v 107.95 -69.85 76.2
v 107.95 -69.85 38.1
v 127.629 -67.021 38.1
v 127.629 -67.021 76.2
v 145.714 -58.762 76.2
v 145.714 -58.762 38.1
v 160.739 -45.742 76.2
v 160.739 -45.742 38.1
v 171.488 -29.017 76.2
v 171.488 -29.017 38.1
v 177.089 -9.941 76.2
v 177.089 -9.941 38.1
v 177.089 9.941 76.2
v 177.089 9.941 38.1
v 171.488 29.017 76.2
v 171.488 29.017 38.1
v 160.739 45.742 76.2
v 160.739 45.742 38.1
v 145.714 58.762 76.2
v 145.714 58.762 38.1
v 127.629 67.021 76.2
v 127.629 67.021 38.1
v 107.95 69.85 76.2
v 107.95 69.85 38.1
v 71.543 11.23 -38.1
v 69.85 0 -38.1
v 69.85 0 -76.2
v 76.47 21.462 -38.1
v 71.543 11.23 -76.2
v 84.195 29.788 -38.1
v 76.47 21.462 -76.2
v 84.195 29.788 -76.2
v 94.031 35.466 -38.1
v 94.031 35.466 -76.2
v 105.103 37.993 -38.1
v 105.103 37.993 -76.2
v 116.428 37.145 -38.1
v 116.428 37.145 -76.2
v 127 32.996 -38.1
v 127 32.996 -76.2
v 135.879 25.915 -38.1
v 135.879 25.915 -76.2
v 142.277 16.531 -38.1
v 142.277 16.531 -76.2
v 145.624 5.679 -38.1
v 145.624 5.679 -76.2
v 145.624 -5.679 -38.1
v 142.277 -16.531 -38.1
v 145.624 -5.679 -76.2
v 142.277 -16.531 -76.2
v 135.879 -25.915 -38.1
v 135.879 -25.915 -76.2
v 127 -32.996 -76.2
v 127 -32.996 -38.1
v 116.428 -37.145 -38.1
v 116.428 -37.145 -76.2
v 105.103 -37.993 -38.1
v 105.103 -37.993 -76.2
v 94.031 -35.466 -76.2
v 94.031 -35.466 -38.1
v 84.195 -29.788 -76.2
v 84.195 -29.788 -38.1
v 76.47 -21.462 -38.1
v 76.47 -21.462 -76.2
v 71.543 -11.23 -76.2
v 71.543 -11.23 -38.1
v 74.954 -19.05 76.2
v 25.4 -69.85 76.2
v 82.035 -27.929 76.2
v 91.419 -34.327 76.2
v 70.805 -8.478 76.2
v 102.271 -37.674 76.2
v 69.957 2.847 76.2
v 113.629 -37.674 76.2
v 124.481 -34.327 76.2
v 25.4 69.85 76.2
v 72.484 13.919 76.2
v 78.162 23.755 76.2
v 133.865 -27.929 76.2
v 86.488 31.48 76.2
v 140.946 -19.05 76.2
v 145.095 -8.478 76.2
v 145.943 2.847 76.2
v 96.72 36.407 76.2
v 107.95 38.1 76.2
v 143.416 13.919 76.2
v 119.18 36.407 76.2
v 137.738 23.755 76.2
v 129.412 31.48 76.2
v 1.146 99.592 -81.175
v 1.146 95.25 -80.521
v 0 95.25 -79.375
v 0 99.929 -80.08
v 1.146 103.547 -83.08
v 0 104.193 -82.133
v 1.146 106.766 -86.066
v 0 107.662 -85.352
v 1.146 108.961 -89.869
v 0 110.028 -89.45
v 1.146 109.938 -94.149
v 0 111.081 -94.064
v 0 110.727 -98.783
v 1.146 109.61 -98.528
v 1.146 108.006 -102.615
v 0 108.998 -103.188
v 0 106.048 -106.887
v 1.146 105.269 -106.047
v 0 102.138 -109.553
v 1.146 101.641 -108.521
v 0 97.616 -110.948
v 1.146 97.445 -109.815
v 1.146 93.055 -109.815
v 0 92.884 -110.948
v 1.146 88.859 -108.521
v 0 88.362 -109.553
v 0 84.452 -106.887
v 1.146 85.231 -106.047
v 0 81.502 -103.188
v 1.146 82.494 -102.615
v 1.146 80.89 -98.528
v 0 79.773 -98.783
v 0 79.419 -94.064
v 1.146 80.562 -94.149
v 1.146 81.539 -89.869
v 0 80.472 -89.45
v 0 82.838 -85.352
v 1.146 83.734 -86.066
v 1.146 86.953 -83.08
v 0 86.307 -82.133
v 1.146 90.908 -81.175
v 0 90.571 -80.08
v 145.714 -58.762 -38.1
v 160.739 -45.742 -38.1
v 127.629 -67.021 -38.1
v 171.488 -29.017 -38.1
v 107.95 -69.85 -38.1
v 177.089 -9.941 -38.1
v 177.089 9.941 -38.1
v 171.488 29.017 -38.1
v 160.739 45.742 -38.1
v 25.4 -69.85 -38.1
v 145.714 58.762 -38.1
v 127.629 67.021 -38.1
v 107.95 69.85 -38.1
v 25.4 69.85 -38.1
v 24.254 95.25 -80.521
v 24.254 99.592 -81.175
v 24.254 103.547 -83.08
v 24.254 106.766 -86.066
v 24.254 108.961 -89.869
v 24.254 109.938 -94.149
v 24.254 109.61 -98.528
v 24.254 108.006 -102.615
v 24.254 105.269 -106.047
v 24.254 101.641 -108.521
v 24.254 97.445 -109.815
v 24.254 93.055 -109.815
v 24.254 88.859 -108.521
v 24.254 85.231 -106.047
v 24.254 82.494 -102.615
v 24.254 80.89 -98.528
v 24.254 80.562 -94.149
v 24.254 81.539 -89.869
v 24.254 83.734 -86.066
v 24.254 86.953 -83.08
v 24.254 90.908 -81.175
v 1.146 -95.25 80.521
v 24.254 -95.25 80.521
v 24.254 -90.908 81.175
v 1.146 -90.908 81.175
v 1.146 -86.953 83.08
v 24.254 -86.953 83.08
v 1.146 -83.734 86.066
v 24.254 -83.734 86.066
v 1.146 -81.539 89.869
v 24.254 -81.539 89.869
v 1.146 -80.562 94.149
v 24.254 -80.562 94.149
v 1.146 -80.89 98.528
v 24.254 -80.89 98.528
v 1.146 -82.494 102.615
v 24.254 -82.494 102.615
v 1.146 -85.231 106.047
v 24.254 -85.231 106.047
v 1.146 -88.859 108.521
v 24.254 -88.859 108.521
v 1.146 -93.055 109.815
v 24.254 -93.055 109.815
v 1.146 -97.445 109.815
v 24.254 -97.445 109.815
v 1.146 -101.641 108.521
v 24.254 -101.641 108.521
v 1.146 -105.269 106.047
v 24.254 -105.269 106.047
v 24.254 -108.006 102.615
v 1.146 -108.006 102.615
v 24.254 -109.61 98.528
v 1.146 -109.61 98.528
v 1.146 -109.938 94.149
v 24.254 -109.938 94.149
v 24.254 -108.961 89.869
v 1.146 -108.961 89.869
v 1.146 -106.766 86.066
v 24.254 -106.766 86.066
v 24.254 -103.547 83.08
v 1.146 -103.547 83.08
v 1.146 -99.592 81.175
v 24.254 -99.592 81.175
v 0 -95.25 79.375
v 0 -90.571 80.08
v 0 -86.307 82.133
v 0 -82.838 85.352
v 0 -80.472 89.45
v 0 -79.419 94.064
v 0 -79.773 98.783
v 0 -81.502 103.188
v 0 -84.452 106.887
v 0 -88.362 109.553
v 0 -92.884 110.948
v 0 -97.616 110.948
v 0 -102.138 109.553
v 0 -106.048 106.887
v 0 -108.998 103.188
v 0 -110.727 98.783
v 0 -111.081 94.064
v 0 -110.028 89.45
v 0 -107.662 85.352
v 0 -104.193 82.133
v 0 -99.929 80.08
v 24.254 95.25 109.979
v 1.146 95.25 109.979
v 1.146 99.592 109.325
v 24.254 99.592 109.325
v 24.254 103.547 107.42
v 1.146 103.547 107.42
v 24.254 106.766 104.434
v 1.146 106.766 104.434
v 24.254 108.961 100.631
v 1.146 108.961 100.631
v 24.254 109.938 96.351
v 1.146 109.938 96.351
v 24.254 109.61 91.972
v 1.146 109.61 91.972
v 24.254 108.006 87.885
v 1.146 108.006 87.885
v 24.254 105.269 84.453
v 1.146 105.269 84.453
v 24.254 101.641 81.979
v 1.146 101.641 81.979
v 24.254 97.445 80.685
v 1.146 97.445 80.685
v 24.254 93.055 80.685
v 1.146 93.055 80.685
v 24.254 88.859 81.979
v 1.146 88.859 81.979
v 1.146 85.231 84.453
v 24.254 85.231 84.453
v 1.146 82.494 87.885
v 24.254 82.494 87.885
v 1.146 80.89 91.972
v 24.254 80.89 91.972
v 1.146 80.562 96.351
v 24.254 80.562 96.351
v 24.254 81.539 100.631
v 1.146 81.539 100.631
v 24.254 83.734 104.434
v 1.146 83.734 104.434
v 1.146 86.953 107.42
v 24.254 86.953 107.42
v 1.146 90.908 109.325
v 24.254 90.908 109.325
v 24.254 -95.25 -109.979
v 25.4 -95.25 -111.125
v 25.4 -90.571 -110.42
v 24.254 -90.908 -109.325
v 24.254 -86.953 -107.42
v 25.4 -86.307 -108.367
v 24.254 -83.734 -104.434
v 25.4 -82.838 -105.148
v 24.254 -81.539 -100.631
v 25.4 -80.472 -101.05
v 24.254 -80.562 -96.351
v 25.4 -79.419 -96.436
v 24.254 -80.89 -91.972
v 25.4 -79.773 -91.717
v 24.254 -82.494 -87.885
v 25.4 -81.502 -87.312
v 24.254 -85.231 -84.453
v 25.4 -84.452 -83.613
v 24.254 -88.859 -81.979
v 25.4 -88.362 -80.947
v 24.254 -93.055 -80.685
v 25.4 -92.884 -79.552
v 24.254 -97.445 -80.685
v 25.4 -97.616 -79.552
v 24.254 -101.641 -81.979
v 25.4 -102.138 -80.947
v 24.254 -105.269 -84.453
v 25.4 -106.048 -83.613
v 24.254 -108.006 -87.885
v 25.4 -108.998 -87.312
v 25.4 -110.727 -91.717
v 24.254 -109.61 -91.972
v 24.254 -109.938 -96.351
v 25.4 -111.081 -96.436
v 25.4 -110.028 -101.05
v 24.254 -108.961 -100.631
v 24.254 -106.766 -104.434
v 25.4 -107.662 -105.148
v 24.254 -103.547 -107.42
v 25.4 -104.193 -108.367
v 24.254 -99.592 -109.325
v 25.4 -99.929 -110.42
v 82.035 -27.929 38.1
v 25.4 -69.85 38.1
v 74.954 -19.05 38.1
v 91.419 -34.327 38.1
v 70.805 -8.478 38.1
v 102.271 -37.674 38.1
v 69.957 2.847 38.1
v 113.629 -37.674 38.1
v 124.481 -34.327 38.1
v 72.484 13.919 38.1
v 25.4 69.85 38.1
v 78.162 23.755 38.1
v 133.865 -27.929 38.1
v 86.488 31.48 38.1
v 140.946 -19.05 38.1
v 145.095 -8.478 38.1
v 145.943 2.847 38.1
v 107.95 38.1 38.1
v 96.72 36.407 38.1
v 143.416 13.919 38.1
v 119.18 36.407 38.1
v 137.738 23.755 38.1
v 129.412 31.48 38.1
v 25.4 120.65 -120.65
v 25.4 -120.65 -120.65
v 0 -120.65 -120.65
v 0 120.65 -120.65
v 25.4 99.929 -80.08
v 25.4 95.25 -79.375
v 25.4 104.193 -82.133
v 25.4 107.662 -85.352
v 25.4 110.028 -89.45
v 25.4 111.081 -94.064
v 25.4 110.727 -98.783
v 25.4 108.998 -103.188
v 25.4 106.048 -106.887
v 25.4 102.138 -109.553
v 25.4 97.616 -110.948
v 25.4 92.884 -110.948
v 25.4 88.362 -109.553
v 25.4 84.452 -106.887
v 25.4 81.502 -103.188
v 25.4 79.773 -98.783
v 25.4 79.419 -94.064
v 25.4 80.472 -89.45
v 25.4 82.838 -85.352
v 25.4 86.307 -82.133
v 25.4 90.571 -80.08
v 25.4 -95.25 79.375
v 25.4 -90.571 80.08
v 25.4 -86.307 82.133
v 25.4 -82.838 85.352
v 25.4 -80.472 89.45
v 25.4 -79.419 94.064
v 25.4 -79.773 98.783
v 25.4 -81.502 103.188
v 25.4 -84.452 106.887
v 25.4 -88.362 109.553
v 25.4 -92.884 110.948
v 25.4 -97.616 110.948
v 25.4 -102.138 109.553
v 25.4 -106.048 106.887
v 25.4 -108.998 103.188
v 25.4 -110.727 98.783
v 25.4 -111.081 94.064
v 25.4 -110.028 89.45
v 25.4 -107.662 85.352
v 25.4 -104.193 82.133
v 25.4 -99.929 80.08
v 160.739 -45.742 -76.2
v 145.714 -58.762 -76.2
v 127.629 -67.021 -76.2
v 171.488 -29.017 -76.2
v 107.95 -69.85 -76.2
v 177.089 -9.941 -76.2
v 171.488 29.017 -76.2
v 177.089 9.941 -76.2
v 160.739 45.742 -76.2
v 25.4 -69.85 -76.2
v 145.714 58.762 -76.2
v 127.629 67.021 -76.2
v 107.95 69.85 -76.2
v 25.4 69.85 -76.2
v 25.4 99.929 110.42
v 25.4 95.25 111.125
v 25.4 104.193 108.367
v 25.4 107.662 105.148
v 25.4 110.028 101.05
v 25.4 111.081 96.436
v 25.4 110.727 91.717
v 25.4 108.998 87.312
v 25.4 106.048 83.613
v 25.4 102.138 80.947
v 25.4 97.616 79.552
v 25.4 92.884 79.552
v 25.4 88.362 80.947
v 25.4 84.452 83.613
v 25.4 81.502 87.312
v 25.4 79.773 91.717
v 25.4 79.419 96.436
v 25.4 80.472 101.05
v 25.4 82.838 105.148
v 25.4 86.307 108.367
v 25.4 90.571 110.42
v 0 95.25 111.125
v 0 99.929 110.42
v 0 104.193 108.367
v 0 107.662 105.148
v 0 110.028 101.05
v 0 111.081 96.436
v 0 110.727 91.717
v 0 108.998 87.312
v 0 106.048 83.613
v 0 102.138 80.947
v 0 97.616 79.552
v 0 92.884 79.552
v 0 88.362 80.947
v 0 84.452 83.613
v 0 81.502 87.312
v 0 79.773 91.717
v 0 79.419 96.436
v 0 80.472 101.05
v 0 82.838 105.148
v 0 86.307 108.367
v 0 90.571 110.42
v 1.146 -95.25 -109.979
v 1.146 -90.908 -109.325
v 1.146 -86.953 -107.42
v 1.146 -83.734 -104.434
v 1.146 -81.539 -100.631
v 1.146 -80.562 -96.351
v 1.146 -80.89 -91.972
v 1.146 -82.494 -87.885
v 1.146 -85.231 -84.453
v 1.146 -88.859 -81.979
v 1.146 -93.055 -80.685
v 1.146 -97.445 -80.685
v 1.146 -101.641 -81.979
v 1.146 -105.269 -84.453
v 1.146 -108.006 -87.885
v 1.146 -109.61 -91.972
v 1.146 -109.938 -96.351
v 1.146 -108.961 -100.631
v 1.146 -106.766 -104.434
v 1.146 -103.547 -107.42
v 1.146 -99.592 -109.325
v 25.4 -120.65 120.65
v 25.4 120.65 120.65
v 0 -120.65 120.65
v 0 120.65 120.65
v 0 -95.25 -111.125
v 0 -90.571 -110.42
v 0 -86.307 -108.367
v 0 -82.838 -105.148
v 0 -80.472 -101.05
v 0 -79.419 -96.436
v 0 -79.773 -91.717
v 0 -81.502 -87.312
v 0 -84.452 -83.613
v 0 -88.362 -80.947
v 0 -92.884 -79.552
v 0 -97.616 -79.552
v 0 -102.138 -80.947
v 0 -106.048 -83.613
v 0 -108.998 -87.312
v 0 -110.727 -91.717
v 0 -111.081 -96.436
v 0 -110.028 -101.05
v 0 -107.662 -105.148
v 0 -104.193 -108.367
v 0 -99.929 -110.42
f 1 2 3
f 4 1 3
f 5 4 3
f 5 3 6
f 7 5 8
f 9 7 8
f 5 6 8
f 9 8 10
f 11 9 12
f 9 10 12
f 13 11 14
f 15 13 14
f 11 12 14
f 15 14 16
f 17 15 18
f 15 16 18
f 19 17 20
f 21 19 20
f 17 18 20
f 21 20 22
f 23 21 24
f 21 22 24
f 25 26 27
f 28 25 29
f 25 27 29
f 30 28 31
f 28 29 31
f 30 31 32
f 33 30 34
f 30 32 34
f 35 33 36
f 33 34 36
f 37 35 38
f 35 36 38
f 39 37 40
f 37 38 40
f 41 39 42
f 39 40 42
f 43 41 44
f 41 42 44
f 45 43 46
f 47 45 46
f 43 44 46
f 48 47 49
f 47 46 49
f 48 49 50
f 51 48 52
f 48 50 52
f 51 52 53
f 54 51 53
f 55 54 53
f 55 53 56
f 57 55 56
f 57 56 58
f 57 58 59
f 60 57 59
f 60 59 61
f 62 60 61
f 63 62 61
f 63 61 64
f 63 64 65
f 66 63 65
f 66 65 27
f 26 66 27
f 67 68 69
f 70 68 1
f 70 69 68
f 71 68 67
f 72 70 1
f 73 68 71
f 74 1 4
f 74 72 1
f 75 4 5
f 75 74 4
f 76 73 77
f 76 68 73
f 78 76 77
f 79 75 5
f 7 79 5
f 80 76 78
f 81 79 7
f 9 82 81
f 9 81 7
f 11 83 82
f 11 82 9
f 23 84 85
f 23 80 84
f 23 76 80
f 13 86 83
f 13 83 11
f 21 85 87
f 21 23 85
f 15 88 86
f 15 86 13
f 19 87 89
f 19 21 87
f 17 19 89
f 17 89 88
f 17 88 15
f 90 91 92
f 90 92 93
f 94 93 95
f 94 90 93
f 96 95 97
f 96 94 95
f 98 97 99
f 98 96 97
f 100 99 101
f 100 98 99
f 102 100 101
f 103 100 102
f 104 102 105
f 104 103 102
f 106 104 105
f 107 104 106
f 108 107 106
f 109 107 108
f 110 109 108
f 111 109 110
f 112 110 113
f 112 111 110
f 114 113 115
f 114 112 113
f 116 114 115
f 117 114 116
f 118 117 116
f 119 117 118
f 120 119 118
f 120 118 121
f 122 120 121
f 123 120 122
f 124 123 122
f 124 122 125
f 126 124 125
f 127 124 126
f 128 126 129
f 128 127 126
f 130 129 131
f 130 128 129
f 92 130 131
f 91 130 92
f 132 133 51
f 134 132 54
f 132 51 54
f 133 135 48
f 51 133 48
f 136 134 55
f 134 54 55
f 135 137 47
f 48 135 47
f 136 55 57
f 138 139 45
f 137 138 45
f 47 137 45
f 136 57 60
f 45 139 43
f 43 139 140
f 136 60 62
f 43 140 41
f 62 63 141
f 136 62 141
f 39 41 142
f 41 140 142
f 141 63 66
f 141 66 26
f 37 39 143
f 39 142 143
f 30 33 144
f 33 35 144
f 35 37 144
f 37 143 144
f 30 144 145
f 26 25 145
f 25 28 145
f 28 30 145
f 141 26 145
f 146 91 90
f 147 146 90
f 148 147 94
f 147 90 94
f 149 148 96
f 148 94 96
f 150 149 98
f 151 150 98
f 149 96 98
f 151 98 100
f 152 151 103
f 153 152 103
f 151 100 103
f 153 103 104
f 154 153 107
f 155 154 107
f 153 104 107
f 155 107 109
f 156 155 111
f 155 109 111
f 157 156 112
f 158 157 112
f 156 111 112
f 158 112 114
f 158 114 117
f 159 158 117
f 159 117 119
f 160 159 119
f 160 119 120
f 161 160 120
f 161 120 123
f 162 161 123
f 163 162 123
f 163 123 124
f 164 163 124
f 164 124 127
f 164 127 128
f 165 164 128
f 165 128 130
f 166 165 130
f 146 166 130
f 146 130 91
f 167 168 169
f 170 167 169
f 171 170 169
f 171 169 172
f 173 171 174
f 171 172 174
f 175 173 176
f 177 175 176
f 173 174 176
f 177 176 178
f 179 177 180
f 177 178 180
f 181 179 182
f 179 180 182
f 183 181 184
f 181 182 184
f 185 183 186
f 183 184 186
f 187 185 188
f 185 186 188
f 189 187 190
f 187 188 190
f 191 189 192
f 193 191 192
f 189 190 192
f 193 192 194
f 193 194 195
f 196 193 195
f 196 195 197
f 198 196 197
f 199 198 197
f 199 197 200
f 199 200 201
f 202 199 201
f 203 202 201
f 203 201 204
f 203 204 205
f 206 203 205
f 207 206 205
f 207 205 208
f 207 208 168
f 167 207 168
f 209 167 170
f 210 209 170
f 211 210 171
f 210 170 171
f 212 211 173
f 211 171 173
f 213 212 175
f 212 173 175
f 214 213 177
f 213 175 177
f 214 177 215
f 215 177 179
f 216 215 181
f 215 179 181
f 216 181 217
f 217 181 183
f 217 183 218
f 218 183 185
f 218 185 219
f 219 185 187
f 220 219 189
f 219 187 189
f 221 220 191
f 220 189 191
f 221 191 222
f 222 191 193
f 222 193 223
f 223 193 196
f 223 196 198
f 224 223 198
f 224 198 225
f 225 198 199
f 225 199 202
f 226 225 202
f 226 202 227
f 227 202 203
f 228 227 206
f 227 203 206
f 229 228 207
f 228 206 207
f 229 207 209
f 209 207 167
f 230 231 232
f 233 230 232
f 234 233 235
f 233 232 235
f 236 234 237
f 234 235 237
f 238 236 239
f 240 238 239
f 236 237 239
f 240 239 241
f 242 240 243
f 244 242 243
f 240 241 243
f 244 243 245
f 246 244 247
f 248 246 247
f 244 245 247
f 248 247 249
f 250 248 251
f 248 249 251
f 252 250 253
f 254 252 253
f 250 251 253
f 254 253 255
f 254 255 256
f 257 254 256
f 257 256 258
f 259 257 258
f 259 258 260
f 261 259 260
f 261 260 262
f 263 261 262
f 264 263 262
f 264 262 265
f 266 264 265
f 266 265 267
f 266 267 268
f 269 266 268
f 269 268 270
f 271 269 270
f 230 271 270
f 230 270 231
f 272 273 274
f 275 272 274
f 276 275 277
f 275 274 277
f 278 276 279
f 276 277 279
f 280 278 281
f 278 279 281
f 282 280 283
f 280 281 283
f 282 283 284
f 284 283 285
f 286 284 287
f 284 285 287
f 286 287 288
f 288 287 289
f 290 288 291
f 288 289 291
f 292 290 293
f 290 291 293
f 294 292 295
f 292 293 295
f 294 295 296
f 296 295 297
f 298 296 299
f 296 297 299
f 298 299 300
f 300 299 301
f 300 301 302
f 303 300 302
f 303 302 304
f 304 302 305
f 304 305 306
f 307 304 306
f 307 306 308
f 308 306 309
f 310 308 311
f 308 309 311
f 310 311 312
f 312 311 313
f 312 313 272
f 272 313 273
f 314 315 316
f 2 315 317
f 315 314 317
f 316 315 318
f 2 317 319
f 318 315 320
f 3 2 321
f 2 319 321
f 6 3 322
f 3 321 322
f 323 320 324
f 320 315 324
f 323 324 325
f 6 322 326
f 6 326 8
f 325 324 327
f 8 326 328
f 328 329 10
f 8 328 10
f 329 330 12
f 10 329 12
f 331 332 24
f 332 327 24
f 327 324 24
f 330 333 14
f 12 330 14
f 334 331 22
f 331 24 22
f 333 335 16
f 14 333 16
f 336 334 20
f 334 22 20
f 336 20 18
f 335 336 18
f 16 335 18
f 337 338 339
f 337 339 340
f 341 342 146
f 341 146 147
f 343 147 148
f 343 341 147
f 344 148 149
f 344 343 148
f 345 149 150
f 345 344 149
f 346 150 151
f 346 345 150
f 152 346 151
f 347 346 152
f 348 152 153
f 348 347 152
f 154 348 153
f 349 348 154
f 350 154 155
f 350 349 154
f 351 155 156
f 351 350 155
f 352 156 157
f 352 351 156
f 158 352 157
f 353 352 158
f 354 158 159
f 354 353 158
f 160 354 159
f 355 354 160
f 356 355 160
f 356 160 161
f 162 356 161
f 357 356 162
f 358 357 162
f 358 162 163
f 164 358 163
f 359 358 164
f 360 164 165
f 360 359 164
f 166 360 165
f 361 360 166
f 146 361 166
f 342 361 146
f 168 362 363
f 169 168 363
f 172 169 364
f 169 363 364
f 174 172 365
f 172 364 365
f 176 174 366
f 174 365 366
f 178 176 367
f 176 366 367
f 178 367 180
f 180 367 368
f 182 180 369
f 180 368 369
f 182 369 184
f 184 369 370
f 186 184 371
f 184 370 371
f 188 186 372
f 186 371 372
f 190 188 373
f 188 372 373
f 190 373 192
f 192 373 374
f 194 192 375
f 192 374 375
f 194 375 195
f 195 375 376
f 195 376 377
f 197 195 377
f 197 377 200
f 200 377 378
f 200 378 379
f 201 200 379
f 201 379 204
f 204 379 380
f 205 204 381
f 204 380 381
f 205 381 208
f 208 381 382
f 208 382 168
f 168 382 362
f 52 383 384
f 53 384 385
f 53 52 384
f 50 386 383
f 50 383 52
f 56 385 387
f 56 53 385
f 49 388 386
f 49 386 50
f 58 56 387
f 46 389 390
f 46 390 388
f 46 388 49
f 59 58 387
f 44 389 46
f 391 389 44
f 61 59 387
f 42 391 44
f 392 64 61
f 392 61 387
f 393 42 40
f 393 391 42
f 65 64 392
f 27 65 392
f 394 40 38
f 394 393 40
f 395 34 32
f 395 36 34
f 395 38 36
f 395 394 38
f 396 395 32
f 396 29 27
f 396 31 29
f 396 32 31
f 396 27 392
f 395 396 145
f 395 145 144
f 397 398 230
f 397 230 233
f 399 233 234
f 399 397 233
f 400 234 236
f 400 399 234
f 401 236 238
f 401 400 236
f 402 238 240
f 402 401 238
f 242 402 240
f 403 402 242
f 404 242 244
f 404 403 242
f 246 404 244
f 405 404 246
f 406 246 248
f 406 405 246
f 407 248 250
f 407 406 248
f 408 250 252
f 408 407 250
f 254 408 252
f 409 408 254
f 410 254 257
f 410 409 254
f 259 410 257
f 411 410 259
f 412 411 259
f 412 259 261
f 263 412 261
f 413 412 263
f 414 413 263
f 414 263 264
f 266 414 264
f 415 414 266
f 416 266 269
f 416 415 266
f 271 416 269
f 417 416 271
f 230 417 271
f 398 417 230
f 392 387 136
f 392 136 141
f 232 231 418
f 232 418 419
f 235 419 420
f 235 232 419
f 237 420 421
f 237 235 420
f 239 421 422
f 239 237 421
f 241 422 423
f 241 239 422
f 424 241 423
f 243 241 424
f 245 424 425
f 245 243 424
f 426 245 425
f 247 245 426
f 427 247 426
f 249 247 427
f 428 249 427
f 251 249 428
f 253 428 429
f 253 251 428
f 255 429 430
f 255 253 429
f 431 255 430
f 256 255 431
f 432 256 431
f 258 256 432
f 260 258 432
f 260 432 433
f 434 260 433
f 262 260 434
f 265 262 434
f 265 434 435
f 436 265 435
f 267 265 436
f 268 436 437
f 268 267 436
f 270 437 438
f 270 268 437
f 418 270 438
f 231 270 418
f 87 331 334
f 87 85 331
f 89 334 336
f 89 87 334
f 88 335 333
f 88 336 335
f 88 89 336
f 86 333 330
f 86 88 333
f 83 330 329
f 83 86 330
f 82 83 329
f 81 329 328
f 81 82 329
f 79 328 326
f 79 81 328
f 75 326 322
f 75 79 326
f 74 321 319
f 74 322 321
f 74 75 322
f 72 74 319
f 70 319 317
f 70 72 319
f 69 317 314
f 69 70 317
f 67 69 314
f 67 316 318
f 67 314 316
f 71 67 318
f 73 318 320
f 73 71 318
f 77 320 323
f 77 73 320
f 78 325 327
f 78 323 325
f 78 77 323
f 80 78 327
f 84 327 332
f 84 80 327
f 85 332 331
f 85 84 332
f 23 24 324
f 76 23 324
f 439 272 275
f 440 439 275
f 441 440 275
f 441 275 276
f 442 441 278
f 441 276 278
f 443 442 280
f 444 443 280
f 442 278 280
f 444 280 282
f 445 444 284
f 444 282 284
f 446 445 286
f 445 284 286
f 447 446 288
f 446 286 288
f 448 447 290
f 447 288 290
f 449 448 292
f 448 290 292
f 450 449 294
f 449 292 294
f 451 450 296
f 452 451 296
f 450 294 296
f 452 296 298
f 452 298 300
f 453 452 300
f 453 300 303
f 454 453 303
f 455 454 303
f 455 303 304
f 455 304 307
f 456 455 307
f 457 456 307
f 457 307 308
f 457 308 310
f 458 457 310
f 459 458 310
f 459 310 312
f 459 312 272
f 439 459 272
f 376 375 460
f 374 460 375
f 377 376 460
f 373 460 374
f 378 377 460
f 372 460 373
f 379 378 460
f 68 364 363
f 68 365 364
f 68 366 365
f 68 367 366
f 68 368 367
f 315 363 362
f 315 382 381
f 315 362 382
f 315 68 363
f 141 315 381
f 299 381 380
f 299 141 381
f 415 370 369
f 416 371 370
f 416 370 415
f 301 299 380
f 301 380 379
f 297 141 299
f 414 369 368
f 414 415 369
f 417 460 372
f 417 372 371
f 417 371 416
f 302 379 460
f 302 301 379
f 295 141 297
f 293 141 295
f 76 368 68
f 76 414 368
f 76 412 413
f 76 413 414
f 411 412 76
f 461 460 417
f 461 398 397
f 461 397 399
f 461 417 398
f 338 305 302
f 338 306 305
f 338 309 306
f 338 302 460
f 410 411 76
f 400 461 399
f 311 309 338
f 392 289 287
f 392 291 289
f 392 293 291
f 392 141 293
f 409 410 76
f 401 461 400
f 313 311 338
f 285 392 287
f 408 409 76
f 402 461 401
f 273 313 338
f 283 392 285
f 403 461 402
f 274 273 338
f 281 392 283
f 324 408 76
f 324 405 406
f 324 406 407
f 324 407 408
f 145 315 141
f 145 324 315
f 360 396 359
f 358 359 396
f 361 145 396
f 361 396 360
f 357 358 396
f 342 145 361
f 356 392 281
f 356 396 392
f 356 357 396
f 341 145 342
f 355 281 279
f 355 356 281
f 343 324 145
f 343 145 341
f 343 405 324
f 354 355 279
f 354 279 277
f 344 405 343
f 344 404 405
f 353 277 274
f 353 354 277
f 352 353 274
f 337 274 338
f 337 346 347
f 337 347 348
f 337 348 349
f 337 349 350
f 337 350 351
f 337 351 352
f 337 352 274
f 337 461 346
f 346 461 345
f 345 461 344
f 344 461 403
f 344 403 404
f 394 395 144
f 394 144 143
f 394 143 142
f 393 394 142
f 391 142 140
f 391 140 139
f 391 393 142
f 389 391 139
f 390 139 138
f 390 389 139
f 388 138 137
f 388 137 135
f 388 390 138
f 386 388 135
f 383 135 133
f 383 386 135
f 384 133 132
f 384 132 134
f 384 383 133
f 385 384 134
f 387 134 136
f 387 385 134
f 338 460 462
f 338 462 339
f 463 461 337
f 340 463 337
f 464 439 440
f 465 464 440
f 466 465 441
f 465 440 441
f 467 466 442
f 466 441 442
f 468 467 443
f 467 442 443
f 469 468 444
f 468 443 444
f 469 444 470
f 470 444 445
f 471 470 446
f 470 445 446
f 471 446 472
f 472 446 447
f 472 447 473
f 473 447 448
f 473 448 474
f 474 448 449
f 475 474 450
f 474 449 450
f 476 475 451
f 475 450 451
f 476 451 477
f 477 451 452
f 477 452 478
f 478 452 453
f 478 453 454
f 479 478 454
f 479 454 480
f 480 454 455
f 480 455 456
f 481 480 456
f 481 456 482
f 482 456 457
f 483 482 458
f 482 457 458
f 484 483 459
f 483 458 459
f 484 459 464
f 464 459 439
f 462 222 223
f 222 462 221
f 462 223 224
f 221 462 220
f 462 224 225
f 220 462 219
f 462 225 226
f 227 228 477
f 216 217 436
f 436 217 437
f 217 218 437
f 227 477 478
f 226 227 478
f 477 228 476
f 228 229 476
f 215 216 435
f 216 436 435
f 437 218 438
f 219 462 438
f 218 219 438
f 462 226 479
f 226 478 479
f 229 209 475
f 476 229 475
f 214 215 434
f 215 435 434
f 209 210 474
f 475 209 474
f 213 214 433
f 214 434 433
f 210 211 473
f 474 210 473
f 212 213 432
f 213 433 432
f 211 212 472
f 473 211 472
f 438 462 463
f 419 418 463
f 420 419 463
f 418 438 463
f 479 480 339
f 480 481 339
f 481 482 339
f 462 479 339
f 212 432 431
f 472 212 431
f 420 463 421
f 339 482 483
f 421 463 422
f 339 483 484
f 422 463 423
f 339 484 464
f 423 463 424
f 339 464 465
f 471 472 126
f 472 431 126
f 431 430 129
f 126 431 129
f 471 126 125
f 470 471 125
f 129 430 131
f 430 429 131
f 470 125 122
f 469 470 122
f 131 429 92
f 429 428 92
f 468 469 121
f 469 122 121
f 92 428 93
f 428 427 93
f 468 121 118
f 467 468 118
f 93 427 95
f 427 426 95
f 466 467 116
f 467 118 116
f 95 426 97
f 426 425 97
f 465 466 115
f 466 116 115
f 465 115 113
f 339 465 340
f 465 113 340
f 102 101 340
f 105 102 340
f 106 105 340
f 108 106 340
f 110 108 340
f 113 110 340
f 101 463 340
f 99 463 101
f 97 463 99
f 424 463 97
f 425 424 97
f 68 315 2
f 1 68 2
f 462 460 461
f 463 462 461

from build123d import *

# Parameters (mm, degrees)
SKETCH1_W                     = 241.3
SKETCH1_H                     = 241.3
BOSS_EXTRUDE1_DEPTH           = 25.4
BOSS_EXTRUDE2_DEPTH           = 38.1
BOSS_EXTRUDE3_START           = -38.1
BOSS_EXTRUDE3_DEPTH           = 38.1
F_1_1_8_CLEARANCE_HOLE1_D     = 29.45892
F_1_1_8_CLEARANCE_HOLE1_DEPTH = 177.8
F_1_1_8_CLEARANCE_HOLE2_D     = 29.45892
SKETCH8_W                     = 38.1
SKETCH8_H                     = 82.55
HOLE2_D                       = 76.2
HOLE2_DEPTH                   = 82.55
CHAMFER1_SIZE                 = 1.14554


with BuildPart() as part:
    # Sketch1 → Boss-Extrude1 (new body)
    with BuildSketch(Plane(origin=(25.4, 0, 0), x_dir=(0, 0, -1), z_dir=(1, 0, 0))):
        Rectangle(SKETCH1_W, SKETCH1_H)
    extrude(amount=-BOSS_EXTRUDE1_DEPTH)

    # Sketch2 → Boss-Extrude2 (add)
    with BuildSketch(Plane(origin=(0, 0, -76.2), x_dir=(-1, 0, 0), z_dir=(0, 0, -1))):
        with BuildLine():
            Line((-25.4, -69.85), (-25.4, 69.85))
            Line((-25.4, 69.85), (-107.95, 69.85))
            ThreePointArc((-107.95, 69.85), (-177.8, 0), (-107.95, -69.85))
            Line((-107.95, -69.85), (-25.4, -69.85))
        make_face()
    extrude(amount=-BOSS_EXTRUDE2_DEPTH)

    # Sketch3 → Boss-Extrude3 (add)
    with BuildSketch(Plane.XY.offset(76.2).offset(BOSS_EXTRUDE3_START)):
        with BuildLine():
            Line((25.4, 69.85), (25.4, -69.85))
            Line((25.4, -69.85), (107.95, -69.85))
            ThreePointArc((107.95, -69.85), (177.8, 0), (107.95, 69.85))
            Line((107.95, 69.85), (25.4, 69.85))
        make_face()
    extrude(amount=BOSS_EXTRUDE3_DEPTH)

    # 1-1/8 Clearance Hole1
    with Locations(Plane.ZY):
        with Locations((-95.25, -95.25), (95.25, -95.25)):
            Hole(F_1_1_8_CLEARANCE_HOLE1_D / 2, depth=F_1_1_8_CLEARANCE_HOLE1_DEPTH)

    # 1-1/8 Clearance Hole2 (through all)
    with Locations(Plane(origin=(25.4, 0, 0), x_dir=(0, 0, -1), z_dir=(1, 0, 0))):
        with Locations((-95.25, 95.25), (95.25, 95.25)):
            Hole(F_1_1_8_CLEARANCE_HOLE2_D / 2)

    # Sketch8 → Hole1 (revolve, cut)
    with BuildSketch(Plane(origin=(107.95, 0, 38.1), x_dir=(0, 1, 0), z_dir=(1, 0, 0))):
        with Locations((19.05, 41.275)):
            Rectangle(SKETCH8_W, SKETCH8_H)
    revolve(axis=Axis((107.95, 0, 148.1), (0, 0, -1)), mode=Mode.SUBTRACT)

    # Hole2
    with Locations(Plane.XY.offset(-38.1)):
        with Locations((107.95, 0)):
            Hole(HOLE2_D / 2, depth=HOLE2_DEPTH)

    # Chamfer1
    chamfer1_edges = [part.edges().sort_by_distance(p)[0] for p in [
        (25.4, -95.25, 109.97946),
        (0, -95.25, 109.97946),
        (25.4, -95.25, -80.52054),
        (0, -95.25, -80.52054),
        (25.4, 95.25, -109.97946),
        (0, 95.25, -109.97946),
        (25.4, 95.25, 80.52054),
        (0, 95.25, 80.52054),
    ]]
    chamfer(chamfer1_edges, length=CHAMFER1_SIZE)


solid = part.part
